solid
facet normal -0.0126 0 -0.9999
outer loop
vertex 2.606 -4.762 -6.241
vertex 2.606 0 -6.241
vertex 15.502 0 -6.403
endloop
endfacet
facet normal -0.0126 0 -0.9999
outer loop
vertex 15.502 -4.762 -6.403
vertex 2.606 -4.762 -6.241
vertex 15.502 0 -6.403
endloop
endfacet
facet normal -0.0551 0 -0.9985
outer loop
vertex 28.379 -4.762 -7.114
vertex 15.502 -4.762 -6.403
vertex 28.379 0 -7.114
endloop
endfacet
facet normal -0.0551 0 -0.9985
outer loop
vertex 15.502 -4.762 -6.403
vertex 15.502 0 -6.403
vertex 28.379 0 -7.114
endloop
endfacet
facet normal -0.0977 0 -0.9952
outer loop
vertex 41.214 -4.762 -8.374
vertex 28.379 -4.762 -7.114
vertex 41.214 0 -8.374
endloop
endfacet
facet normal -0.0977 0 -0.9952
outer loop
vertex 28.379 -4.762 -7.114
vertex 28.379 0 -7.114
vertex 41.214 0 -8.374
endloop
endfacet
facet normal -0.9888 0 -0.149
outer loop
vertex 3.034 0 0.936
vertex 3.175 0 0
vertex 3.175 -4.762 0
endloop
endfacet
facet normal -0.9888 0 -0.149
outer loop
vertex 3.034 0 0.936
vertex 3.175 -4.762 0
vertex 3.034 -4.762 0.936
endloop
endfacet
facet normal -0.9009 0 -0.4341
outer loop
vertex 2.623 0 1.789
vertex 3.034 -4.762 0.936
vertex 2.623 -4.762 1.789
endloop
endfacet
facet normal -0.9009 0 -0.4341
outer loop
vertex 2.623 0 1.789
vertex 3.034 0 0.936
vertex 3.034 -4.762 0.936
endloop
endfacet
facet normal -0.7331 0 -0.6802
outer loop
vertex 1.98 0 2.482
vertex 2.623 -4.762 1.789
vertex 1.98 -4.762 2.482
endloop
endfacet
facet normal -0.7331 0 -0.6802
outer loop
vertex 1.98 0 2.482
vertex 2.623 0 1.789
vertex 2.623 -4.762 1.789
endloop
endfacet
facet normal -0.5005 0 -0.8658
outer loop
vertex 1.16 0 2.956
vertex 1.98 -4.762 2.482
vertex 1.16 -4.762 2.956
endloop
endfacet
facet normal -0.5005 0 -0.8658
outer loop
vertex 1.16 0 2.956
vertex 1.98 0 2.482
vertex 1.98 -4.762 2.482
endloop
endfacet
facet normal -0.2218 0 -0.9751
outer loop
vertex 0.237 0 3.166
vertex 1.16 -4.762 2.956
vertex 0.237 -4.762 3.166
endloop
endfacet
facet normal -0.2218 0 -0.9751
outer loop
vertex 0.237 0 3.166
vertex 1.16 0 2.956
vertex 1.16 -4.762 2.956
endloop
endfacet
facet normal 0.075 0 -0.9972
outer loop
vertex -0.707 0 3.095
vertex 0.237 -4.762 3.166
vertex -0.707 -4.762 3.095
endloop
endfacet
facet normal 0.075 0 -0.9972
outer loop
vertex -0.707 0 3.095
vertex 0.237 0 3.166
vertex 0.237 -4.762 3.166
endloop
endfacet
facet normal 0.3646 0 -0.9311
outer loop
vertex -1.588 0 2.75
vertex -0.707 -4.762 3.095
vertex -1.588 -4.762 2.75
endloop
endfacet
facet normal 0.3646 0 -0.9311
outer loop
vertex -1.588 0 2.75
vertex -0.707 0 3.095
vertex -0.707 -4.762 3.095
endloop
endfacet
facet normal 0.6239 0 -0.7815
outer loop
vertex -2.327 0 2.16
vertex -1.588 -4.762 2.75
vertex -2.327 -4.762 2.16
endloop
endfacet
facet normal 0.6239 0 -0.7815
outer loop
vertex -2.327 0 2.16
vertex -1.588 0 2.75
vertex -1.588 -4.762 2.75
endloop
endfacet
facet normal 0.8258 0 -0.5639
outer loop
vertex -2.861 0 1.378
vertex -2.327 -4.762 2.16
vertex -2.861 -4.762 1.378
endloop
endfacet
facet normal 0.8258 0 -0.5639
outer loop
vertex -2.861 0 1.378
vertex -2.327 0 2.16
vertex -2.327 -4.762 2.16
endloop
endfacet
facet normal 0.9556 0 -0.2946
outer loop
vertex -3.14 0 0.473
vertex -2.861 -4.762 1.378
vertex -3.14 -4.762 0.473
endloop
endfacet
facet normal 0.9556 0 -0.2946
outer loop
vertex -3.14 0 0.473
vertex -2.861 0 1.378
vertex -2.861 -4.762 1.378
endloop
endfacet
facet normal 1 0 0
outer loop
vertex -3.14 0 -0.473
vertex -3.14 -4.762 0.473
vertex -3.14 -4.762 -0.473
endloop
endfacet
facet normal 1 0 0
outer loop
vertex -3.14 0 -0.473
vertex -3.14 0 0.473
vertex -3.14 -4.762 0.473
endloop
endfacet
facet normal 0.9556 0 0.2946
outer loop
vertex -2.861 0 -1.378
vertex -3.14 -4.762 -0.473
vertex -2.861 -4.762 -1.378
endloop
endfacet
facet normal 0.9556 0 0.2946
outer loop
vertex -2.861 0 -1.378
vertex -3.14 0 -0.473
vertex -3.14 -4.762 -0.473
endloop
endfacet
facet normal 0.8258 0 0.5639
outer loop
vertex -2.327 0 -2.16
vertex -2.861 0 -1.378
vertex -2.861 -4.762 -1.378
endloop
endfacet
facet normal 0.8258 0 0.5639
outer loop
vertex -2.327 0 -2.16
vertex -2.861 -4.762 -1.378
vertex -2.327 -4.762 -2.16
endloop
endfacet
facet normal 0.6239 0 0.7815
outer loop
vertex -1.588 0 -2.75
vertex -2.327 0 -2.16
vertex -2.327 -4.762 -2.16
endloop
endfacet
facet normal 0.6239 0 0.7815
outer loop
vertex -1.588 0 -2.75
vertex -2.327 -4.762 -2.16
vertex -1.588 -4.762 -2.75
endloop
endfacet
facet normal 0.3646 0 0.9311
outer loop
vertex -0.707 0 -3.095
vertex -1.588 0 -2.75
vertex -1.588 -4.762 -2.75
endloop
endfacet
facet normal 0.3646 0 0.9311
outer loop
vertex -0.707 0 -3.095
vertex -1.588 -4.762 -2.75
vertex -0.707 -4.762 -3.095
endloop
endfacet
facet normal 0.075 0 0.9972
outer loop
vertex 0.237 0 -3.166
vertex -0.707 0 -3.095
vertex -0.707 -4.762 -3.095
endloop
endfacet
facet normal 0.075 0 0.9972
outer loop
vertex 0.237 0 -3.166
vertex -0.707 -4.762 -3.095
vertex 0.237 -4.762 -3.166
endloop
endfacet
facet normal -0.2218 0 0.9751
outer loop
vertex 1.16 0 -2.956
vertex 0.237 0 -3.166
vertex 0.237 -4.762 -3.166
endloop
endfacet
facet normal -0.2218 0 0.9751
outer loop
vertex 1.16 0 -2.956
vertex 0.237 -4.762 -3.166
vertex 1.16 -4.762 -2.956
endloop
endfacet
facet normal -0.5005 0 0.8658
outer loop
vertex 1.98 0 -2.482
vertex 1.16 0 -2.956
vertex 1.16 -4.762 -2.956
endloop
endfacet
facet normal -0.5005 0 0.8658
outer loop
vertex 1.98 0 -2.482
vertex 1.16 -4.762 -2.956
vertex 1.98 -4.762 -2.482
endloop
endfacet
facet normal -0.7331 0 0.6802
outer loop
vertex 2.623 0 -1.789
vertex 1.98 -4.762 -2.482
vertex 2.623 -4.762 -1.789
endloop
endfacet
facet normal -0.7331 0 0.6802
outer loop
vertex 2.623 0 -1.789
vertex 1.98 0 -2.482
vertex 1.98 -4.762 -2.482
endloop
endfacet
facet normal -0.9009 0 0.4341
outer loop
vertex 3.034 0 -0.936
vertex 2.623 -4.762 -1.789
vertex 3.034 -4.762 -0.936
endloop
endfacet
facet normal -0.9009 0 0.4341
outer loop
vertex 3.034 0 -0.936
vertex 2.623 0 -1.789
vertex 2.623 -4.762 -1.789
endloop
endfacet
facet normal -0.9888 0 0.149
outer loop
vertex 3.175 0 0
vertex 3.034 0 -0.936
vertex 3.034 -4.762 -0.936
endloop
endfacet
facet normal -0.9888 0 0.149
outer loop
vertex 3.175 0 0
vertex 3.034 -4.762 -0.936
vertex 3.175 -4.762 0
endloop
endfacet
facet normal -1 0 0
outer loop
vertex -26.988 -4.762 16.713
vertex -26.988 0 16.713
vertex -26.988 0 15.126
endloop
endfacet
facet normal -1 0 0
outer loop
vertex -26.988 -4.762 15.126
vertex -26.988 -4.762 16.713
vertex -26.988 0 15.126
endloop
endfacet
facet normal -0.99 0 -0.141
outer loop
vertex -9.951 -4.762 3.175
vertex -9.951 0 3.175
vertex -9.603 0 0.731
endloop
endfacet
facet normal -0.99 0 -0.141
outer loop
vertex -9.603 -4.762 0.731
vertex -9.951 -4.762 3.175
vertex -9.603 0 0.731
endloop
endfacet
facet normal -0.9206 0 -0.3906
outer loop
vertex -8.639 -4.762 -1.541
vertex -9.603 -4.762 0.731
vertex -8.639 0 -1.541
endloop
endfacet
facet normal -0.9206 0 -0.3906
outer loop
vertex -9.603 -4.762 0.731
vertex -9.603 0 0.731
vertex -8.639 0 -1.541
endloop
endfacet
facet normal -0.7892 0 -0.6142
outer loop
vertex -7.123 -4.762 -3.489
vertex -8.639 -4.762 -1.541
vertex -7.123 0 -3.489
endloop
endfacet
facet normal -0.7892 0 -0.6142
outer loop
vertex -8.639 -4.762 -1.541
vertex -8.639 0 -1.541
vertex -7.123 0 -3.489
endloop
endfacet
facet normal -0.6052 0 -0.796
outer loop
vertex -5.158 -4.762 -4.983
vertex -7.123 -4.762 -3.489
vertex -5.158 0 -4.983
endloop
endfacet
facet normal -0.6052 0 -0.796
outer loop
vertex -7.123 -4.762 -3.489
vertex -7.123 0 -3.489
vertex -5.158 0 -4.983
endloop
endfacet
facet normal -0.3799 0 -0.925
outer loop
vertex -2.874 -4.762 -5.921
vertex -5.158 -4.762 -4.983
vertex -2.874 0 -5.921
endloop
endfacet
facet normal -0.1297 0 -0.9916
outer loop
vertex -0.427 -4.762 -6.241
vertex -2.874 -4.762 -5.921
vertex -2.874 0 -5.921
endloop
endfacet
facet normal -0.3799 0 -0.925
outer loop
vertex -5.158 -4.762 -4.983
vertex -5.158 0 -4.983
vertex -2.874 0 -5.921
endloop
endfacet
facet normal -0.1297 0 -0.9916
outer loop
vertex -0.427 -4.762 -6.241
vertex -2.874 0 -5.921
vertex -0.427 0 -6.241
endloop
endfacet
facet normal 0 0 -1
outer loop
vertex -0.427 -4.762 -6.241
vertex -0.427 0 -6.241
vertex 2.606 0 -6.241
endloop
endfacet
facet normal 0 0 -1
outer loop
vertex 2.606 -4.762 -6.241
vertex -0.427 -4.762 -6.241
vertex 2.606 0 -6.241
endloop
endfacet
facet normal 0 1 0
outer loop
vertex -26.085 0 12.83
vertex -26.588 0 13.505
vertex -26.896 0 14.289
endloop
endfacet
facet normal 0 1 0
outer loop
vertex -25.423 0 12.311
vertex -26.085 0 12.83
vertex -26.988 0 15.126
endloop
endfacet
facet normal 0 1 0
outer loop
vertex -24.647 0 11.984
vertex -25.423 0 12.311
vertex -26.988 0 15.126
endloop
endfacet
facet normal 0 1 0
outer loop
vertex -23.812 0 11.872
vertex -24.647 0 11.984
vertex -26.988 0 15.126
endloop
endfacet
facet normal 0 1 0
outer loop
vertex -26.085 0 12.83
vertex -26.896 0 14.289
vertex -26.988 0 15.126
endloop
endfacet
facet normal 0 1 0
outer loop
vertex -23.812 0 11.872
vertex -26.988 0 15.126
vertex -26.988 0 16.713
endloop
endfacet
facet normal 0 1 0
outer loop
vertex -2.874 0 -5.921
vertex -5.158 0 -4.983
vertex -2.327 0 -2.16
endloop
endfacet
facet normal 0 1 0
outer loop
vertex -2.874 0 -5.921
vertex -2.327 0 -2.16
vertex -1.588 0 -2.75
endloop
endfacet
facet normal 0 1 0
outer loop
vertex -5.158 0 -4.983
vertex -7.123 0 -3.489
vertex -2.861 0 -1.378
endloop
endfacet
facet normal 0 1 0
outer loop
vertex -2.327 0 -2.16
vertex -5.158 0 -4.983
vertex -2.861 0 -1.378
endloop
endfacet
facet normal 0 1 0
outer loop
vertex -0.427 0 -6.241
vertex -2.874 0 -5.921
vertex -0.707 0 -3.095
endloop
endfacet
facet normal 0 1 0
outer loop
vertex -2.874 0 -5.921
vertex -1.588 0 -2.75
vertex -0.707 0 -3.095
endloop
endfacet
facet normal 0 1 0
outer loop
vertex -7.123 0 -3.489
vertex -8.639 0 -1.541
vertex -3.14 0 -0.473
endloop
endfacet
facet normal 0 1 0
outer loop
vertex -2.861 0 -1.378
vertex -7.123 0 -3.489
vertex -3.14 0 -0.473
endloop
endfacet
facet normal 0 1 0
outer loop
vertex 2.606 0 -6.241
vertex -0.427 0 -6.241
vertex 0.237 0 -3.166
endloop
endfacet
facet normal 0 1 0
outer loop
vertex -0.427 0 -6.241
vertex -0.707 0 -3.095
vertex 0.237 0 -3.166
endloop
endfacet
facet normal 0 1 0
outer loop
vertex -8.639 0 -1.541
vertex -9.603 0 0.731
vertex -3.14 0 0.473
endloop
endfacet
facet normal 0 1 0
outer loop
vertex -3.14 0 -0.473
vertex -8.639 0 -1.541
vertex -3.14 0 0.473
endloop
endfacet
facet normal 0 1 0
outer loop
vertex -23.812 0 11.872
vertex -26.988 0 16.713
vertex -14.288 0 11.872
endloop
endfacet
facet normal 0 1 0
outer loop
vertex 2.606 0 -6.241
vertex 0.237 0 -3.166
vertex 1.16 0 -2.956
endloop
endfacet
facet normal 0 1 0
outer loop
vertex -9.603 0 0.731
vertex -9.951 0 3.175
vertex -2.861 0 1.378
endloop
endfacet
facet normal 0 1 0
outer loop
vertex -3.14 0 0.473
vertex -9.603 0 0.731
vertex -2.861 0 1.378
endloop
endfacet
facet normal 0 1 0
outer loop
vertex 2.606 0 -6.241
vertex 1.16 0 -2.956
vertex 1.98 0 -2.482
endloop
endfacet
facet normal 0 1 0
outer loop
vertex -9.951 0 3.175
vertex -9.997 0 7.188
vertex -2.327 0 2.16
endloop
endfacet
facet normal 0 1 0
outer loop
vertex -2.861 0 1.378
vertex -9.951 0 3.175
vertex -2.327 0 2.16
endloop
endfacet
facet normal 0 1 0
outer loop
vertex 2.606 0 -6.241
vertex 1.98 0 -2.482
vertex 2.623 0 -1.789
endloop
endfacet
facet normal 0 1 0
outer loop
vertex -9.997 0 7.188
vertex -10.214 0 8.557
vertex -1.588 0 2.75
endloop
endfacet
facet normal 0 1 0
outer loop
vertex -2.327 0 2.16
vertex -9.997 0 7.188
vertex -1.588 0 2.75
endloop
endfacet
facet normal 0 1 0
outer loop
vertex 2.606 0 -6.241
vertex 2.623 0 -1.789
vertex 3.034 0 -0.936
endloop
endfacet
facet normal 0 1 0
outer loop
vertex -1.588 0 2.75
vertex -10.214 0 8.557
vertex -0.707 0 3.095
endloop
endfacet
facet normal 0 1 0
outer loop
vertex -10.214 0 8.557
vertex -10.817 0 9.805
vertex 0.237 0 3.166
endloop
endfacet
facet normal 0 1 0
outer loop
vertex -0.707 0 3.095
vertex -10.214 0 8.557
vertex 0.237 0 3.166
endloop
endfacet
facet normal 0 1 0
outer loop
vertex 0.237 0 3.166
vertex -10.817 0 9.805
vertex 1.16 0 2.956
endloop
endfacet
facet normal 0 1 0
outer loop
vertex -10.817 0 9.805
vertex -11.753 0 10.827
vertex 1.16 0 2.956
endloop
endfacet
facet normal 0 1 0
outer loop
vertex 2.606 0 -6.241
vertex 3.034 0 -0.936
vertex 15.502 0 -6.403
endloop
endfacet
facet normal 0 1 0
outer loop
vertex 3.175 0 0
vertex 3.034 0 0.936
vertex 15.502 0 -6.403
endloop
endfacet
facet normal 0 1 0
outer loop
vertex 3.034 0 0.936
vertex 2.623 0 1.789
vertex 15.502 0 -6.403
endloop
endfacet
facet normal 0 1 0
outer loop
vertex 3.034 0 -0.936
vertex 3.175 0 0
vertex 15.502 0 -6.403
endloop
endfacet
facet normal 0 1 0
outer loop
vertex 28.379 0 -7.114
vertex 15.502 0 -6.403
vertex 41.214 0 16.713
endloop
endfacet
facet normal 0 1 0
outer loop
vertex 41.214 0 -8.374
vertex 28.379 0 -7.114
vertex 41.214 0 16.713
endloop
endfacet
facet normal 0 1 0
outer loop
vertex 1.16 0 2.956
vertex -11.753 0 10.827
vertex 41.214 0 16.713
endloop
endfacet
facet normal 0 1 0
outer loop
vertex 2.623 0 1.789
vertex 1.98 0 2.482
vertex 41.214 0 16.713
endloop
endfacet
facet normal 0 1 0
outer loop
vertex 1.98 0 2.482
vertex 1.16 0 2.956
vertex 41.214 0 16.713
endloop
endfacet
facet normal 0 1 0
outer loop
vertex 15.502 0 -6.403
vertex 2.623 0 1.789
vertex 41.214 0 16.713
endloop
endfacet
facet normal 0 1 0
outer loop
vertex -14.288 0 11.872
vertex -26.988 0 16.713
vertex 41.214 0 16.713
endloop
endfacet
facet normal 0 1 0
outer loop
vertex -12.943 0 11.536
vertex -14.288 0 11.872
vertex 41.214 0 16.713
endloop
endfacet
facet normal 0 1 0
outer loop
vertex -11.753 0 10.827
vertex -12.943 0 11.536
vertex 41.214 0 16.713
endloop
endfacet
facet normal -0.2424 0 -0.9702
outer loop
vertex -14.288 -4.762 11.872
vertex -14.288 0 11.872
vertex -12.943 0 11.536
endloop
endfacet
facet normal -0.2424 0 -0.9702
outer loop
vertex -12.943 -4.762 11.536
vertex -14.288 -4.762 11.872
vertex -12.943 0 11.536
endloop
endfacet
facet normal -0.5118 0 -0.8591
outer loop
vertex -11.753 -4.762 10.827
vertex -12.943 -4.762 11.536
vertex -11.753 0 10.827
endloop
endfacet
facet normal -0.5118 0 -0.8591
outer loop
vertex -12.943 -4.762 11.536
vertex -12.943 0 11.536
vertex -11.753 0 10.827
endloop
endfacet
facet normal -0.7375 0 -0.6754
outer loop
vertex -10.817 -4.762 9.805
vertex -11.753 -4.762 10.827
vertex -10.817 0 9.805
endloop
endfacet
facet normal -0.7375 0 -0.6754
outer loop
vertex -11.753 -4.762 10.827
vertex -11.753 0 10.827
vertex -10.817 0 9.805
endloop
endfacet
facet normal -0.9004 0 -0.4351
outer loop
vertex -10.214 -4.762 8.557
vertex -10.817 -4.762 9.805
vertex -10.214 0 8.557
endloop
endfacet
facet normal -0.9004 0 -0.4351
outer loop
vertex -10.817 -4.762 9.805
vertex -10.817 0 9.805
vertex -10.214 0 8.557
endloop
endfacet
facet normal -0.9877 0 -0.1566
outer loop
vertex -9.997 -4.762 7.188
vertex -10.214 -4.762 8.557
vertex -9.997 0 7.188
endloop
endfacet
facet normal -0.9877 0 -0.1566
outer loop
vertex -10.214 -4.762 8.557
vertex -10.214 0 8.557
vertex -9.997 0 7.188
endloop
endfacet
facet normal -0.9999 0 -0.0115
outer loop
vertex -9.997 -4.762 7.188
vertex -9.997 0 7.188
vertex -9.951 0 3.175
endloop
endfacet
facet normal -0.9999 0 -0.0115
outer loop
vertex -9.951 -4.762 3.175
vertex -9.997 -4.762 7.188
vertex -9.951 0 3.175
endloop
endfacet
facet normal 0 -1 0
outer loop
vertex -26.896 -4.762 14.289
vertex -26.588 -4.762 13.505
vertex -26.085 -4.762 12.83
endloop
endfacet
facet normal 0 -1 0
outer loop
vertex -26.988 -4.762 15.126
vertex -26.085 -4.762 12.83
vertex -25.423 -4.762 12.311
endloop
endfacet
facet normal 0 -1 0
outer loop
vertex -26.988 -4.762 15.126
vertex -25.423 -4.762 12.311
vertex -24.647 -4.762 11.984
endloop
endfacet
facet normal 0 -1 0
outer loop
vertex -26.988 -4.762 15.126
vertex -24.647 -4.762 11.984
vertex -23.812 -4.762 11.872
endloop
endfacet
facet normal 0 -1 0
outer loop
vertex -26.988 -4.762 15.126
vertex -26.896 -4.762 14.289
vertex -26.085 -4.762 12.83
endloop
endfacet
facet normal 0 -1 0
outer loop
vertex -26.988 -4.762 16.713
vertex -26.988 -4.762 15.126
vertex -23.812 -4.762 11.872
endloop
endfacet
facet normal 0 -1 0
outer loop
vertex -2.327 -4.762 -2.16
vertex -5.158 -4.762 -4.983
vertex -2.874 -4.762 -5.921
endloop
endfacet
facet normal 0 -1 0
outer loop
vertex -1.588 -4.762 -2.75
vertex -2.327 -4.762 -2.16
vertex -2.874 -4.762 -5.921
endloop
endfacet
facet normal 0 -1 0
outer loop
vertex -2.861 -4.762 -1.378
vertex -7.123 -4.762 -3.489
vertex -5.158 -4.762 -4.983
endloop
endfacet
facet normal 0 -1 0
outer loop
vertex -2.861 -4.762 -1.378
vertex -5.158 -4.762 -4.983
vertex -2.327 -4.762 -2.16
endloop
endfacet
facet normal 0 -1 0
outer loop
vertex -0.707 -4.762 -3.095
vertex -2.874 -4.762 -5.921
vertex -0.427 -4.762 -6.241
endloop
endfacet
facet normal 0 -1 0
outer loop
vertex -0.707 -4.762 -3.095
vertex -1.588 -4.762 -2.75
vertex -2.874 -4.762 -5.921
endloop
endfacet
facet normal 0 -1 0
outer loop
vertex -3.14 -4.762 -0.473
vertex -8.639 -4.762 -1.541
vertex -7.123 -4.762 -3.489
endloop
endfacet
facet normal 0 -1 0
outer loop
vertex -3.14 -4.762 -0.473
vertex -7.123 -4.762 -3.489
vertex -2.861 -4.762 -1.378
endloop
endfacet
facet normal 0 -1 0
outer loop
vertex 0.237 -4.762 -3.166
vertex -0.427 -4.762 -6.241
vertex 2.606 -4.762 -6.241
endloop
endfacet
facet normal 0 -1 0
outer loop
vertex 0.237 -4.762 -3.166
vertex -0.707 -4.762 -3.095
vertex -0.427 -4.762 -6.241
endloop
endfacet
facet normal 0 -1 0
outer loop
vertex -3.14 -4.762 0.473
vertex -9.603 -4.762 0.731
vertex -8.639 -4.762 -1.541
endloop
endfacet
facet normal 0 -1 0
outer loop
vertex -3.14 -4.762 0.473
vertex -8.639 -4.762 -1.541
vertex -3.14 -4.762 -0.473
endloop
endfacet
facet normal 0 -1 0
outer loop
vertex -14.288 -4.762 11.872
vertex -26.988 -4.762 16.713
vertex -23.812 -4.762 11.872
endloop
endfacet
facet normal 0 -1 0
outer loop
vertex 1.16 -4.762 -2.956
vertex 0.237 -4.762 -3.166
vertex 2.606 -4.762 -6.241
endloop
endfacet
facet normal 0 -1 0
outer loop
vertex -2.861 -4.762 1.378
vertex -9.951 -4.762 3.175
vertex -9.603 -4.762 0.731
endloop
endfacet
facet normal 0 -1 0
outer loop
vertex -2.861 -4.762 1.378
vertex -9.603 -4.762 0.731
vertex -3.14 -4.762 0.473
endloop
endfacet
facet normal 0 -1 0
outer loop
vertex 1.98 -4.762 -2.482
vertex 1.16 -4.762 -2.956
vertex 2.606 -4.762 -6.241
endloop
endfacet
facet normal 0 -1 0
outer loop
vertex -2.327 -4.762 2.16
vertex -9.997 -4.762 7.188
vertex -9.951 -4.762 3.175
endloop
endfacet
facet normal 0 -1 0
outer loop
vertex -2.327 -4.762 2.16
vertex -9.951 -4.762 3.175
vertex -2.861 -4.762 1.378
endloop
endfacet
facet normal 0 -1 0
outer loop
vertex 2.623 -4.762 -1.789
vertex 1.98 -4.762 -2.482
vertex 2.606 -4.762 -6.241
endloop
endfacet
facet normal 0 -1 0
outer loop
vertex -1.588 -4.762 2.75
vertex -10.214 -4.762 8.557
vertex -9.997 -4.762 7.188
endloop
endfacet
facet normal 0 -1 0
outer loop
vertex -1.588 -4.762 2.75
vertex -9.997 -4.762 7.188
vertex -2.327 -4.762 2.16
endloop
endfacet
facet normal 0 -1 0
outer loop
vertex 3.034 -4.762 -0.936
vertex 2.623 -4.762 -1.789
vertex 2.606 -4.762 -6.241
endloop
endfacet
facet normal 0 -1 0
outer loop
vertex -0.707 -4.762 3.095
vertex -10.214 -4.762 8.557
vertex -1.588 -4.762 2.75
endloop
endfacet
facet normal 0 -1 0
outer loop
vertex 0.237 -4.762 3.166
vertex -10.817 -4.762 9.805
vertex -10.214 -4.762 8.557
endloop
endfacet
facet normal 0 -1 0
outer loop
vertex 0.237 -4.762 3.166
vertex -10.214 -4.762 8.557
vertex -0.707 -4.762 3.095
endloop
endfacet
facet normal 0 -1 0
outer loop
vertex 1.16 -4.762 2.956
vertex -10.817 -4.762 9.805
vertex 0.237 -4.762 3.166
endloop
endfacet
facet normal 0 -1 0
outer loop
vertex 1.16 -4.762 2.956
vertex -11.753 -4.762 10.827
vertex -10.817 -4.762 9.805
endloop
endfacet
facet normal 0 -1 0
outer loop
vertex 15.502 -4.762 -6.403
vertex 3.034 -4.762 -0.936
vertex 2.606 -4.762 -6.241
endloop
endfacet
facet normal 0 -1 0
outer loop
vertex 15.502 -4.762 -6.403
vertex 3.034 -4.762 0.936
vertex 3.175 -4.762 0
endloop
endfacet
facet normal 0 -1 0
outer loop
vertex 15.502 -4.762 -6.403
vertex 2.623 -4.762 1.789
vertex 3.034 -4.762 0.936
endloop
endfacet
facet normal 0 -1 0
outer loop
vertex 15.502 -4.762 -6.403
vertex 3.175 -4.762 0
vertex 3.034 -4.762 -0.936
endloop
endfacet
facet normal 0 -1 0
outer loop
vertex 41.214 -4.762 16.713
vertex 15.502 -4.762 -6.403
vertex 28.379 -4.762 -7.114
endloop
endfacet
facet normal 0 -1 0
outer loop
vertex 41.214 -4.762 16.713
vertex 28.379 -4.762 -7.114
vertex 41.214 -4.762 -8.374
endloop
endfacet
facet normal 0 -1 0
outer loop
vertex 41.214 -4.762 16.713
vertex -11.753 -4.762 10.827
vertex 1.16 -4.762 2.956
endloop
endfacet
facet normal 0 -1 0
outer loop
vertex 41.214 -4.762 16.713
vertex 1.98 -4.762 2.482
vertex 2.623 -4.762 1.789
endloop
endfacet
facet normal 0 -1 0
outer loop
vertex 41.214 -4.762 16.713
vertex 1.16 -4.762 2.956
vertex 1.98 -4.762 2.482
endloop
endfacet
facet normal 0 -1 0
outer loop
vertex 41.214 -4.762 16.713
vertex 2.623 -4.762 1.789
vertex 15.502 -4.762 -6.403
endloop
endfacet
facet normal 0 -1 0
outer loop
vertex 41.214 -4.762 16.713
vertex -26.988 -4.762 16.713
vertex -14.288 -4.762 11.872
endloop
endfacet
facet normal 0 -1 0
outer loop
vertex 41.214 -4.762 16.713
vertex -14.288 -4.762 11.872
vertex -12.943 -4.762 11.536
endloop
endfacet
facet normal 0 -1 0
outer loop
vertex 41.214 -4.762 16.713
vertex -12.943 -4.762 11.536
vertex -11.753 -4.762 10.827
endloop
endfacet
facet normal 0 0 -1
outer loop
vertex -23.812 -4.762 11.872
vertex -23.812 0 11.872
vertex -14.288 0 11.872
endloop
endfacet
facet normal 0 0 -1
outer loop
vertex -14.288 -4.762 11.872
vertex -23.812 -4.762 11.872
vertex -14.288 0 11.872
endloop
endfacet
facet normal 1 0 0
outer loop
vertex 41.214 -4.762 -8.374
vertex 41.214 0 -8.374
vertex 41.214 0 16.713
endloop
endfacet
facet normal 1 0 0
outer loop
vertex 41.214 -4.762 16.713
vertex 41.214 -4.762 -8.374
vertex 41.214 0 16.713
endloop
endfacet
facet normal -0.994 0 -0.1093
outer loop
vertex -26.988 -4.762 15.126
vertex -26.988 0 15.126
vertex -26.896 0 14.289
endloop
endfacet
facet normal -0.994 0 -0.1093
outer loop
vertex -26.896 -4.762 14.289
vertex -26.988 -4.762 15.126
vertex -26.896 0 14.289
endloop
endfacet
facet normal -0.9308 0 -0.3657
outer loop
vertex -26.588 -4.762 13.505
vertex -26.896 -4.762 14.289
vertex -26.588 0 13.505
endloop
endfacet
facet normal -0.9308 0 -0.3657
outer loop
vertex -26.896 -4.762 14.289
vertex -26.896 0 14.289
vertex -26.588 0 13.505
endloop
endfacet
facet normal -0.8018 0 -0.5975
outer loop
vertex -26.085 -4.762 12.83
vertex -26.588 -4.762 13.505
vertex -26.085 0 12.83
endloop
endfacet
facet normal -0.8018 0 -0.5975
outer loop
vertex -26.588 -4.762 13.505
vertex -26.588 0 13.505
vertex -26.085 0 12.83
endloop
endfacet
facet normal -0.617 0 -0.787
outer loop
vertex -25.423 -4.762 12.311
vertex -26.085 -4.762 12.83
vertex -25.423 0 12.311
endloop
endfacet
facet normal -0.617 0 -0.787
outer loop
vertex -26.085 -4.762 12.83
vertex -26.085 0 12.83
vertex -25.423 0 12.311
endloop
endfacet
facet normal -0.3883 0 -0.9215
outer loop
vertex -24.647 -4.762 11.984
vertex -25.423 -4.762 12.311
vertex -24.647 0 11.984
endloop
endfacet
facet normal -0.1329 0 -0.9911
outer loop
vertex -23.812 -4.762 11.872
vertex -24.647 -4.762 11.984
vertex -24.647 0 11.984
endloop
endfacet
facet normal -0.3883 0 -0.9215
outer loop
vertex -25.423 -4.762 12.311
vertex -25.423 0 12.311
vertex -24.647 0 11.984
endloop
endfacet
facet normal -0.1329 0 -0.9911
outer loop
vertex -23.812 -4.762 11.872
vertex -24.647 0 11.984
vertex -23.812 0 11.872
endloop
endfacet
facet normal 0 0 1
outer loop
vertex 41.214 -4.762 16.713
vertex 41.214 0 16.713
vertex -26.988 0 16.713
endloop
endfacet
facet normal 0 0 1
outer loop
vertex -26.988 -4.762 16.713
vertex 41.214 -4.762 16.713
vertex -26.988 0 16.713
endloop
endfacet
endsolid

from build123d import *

# Parameters (mm, degrees)
F0_R     = 3.175
F1_DEPTH = 4.7625


with BuildPart() as f1:
    # F0 (on Front) → F1 (new body)
    with BuildSketch(Plane.XZ):
        with BuildLine():
            Line((41.21404, 16.7132), (-26.9875, 16.7132))
            Line((-26.9875, 16.7132), (-26.9875, 15.1257))
            ThreePointArc((-26.9875, 15.1257), (-26.085416, 12.83013), (-23.8125, 11.872399))
            Line((-23.8125, 11.872399), (-14.2875, 11.872399))
            ThreePointArc((-14.2875, 11.872399), (-11.24722, 10.349956), (-9.997112, 7.187936))
            Line((-9.997112, 7.187936), (-9.951094, 3.175))
            ThreePointArc((-9.951094, 3.175), (-7.123186, -3.489477), (-0.42672, -6.24078))
            Line((-0.42672, -6.24078), (2.60604, -6.24078))
            ThreePointArc((2.60604, -6.24078), (21.944184, -6.689743), (41.21404, -8.37438))
            Line((41.21404, -8.37438), (41.21404, 16.7132))
        make_face()
        Circle(F0_R, mode=Mode.SUBTRACT)
    extrude(amount=F1_DEPTH)


solid = f1.part
